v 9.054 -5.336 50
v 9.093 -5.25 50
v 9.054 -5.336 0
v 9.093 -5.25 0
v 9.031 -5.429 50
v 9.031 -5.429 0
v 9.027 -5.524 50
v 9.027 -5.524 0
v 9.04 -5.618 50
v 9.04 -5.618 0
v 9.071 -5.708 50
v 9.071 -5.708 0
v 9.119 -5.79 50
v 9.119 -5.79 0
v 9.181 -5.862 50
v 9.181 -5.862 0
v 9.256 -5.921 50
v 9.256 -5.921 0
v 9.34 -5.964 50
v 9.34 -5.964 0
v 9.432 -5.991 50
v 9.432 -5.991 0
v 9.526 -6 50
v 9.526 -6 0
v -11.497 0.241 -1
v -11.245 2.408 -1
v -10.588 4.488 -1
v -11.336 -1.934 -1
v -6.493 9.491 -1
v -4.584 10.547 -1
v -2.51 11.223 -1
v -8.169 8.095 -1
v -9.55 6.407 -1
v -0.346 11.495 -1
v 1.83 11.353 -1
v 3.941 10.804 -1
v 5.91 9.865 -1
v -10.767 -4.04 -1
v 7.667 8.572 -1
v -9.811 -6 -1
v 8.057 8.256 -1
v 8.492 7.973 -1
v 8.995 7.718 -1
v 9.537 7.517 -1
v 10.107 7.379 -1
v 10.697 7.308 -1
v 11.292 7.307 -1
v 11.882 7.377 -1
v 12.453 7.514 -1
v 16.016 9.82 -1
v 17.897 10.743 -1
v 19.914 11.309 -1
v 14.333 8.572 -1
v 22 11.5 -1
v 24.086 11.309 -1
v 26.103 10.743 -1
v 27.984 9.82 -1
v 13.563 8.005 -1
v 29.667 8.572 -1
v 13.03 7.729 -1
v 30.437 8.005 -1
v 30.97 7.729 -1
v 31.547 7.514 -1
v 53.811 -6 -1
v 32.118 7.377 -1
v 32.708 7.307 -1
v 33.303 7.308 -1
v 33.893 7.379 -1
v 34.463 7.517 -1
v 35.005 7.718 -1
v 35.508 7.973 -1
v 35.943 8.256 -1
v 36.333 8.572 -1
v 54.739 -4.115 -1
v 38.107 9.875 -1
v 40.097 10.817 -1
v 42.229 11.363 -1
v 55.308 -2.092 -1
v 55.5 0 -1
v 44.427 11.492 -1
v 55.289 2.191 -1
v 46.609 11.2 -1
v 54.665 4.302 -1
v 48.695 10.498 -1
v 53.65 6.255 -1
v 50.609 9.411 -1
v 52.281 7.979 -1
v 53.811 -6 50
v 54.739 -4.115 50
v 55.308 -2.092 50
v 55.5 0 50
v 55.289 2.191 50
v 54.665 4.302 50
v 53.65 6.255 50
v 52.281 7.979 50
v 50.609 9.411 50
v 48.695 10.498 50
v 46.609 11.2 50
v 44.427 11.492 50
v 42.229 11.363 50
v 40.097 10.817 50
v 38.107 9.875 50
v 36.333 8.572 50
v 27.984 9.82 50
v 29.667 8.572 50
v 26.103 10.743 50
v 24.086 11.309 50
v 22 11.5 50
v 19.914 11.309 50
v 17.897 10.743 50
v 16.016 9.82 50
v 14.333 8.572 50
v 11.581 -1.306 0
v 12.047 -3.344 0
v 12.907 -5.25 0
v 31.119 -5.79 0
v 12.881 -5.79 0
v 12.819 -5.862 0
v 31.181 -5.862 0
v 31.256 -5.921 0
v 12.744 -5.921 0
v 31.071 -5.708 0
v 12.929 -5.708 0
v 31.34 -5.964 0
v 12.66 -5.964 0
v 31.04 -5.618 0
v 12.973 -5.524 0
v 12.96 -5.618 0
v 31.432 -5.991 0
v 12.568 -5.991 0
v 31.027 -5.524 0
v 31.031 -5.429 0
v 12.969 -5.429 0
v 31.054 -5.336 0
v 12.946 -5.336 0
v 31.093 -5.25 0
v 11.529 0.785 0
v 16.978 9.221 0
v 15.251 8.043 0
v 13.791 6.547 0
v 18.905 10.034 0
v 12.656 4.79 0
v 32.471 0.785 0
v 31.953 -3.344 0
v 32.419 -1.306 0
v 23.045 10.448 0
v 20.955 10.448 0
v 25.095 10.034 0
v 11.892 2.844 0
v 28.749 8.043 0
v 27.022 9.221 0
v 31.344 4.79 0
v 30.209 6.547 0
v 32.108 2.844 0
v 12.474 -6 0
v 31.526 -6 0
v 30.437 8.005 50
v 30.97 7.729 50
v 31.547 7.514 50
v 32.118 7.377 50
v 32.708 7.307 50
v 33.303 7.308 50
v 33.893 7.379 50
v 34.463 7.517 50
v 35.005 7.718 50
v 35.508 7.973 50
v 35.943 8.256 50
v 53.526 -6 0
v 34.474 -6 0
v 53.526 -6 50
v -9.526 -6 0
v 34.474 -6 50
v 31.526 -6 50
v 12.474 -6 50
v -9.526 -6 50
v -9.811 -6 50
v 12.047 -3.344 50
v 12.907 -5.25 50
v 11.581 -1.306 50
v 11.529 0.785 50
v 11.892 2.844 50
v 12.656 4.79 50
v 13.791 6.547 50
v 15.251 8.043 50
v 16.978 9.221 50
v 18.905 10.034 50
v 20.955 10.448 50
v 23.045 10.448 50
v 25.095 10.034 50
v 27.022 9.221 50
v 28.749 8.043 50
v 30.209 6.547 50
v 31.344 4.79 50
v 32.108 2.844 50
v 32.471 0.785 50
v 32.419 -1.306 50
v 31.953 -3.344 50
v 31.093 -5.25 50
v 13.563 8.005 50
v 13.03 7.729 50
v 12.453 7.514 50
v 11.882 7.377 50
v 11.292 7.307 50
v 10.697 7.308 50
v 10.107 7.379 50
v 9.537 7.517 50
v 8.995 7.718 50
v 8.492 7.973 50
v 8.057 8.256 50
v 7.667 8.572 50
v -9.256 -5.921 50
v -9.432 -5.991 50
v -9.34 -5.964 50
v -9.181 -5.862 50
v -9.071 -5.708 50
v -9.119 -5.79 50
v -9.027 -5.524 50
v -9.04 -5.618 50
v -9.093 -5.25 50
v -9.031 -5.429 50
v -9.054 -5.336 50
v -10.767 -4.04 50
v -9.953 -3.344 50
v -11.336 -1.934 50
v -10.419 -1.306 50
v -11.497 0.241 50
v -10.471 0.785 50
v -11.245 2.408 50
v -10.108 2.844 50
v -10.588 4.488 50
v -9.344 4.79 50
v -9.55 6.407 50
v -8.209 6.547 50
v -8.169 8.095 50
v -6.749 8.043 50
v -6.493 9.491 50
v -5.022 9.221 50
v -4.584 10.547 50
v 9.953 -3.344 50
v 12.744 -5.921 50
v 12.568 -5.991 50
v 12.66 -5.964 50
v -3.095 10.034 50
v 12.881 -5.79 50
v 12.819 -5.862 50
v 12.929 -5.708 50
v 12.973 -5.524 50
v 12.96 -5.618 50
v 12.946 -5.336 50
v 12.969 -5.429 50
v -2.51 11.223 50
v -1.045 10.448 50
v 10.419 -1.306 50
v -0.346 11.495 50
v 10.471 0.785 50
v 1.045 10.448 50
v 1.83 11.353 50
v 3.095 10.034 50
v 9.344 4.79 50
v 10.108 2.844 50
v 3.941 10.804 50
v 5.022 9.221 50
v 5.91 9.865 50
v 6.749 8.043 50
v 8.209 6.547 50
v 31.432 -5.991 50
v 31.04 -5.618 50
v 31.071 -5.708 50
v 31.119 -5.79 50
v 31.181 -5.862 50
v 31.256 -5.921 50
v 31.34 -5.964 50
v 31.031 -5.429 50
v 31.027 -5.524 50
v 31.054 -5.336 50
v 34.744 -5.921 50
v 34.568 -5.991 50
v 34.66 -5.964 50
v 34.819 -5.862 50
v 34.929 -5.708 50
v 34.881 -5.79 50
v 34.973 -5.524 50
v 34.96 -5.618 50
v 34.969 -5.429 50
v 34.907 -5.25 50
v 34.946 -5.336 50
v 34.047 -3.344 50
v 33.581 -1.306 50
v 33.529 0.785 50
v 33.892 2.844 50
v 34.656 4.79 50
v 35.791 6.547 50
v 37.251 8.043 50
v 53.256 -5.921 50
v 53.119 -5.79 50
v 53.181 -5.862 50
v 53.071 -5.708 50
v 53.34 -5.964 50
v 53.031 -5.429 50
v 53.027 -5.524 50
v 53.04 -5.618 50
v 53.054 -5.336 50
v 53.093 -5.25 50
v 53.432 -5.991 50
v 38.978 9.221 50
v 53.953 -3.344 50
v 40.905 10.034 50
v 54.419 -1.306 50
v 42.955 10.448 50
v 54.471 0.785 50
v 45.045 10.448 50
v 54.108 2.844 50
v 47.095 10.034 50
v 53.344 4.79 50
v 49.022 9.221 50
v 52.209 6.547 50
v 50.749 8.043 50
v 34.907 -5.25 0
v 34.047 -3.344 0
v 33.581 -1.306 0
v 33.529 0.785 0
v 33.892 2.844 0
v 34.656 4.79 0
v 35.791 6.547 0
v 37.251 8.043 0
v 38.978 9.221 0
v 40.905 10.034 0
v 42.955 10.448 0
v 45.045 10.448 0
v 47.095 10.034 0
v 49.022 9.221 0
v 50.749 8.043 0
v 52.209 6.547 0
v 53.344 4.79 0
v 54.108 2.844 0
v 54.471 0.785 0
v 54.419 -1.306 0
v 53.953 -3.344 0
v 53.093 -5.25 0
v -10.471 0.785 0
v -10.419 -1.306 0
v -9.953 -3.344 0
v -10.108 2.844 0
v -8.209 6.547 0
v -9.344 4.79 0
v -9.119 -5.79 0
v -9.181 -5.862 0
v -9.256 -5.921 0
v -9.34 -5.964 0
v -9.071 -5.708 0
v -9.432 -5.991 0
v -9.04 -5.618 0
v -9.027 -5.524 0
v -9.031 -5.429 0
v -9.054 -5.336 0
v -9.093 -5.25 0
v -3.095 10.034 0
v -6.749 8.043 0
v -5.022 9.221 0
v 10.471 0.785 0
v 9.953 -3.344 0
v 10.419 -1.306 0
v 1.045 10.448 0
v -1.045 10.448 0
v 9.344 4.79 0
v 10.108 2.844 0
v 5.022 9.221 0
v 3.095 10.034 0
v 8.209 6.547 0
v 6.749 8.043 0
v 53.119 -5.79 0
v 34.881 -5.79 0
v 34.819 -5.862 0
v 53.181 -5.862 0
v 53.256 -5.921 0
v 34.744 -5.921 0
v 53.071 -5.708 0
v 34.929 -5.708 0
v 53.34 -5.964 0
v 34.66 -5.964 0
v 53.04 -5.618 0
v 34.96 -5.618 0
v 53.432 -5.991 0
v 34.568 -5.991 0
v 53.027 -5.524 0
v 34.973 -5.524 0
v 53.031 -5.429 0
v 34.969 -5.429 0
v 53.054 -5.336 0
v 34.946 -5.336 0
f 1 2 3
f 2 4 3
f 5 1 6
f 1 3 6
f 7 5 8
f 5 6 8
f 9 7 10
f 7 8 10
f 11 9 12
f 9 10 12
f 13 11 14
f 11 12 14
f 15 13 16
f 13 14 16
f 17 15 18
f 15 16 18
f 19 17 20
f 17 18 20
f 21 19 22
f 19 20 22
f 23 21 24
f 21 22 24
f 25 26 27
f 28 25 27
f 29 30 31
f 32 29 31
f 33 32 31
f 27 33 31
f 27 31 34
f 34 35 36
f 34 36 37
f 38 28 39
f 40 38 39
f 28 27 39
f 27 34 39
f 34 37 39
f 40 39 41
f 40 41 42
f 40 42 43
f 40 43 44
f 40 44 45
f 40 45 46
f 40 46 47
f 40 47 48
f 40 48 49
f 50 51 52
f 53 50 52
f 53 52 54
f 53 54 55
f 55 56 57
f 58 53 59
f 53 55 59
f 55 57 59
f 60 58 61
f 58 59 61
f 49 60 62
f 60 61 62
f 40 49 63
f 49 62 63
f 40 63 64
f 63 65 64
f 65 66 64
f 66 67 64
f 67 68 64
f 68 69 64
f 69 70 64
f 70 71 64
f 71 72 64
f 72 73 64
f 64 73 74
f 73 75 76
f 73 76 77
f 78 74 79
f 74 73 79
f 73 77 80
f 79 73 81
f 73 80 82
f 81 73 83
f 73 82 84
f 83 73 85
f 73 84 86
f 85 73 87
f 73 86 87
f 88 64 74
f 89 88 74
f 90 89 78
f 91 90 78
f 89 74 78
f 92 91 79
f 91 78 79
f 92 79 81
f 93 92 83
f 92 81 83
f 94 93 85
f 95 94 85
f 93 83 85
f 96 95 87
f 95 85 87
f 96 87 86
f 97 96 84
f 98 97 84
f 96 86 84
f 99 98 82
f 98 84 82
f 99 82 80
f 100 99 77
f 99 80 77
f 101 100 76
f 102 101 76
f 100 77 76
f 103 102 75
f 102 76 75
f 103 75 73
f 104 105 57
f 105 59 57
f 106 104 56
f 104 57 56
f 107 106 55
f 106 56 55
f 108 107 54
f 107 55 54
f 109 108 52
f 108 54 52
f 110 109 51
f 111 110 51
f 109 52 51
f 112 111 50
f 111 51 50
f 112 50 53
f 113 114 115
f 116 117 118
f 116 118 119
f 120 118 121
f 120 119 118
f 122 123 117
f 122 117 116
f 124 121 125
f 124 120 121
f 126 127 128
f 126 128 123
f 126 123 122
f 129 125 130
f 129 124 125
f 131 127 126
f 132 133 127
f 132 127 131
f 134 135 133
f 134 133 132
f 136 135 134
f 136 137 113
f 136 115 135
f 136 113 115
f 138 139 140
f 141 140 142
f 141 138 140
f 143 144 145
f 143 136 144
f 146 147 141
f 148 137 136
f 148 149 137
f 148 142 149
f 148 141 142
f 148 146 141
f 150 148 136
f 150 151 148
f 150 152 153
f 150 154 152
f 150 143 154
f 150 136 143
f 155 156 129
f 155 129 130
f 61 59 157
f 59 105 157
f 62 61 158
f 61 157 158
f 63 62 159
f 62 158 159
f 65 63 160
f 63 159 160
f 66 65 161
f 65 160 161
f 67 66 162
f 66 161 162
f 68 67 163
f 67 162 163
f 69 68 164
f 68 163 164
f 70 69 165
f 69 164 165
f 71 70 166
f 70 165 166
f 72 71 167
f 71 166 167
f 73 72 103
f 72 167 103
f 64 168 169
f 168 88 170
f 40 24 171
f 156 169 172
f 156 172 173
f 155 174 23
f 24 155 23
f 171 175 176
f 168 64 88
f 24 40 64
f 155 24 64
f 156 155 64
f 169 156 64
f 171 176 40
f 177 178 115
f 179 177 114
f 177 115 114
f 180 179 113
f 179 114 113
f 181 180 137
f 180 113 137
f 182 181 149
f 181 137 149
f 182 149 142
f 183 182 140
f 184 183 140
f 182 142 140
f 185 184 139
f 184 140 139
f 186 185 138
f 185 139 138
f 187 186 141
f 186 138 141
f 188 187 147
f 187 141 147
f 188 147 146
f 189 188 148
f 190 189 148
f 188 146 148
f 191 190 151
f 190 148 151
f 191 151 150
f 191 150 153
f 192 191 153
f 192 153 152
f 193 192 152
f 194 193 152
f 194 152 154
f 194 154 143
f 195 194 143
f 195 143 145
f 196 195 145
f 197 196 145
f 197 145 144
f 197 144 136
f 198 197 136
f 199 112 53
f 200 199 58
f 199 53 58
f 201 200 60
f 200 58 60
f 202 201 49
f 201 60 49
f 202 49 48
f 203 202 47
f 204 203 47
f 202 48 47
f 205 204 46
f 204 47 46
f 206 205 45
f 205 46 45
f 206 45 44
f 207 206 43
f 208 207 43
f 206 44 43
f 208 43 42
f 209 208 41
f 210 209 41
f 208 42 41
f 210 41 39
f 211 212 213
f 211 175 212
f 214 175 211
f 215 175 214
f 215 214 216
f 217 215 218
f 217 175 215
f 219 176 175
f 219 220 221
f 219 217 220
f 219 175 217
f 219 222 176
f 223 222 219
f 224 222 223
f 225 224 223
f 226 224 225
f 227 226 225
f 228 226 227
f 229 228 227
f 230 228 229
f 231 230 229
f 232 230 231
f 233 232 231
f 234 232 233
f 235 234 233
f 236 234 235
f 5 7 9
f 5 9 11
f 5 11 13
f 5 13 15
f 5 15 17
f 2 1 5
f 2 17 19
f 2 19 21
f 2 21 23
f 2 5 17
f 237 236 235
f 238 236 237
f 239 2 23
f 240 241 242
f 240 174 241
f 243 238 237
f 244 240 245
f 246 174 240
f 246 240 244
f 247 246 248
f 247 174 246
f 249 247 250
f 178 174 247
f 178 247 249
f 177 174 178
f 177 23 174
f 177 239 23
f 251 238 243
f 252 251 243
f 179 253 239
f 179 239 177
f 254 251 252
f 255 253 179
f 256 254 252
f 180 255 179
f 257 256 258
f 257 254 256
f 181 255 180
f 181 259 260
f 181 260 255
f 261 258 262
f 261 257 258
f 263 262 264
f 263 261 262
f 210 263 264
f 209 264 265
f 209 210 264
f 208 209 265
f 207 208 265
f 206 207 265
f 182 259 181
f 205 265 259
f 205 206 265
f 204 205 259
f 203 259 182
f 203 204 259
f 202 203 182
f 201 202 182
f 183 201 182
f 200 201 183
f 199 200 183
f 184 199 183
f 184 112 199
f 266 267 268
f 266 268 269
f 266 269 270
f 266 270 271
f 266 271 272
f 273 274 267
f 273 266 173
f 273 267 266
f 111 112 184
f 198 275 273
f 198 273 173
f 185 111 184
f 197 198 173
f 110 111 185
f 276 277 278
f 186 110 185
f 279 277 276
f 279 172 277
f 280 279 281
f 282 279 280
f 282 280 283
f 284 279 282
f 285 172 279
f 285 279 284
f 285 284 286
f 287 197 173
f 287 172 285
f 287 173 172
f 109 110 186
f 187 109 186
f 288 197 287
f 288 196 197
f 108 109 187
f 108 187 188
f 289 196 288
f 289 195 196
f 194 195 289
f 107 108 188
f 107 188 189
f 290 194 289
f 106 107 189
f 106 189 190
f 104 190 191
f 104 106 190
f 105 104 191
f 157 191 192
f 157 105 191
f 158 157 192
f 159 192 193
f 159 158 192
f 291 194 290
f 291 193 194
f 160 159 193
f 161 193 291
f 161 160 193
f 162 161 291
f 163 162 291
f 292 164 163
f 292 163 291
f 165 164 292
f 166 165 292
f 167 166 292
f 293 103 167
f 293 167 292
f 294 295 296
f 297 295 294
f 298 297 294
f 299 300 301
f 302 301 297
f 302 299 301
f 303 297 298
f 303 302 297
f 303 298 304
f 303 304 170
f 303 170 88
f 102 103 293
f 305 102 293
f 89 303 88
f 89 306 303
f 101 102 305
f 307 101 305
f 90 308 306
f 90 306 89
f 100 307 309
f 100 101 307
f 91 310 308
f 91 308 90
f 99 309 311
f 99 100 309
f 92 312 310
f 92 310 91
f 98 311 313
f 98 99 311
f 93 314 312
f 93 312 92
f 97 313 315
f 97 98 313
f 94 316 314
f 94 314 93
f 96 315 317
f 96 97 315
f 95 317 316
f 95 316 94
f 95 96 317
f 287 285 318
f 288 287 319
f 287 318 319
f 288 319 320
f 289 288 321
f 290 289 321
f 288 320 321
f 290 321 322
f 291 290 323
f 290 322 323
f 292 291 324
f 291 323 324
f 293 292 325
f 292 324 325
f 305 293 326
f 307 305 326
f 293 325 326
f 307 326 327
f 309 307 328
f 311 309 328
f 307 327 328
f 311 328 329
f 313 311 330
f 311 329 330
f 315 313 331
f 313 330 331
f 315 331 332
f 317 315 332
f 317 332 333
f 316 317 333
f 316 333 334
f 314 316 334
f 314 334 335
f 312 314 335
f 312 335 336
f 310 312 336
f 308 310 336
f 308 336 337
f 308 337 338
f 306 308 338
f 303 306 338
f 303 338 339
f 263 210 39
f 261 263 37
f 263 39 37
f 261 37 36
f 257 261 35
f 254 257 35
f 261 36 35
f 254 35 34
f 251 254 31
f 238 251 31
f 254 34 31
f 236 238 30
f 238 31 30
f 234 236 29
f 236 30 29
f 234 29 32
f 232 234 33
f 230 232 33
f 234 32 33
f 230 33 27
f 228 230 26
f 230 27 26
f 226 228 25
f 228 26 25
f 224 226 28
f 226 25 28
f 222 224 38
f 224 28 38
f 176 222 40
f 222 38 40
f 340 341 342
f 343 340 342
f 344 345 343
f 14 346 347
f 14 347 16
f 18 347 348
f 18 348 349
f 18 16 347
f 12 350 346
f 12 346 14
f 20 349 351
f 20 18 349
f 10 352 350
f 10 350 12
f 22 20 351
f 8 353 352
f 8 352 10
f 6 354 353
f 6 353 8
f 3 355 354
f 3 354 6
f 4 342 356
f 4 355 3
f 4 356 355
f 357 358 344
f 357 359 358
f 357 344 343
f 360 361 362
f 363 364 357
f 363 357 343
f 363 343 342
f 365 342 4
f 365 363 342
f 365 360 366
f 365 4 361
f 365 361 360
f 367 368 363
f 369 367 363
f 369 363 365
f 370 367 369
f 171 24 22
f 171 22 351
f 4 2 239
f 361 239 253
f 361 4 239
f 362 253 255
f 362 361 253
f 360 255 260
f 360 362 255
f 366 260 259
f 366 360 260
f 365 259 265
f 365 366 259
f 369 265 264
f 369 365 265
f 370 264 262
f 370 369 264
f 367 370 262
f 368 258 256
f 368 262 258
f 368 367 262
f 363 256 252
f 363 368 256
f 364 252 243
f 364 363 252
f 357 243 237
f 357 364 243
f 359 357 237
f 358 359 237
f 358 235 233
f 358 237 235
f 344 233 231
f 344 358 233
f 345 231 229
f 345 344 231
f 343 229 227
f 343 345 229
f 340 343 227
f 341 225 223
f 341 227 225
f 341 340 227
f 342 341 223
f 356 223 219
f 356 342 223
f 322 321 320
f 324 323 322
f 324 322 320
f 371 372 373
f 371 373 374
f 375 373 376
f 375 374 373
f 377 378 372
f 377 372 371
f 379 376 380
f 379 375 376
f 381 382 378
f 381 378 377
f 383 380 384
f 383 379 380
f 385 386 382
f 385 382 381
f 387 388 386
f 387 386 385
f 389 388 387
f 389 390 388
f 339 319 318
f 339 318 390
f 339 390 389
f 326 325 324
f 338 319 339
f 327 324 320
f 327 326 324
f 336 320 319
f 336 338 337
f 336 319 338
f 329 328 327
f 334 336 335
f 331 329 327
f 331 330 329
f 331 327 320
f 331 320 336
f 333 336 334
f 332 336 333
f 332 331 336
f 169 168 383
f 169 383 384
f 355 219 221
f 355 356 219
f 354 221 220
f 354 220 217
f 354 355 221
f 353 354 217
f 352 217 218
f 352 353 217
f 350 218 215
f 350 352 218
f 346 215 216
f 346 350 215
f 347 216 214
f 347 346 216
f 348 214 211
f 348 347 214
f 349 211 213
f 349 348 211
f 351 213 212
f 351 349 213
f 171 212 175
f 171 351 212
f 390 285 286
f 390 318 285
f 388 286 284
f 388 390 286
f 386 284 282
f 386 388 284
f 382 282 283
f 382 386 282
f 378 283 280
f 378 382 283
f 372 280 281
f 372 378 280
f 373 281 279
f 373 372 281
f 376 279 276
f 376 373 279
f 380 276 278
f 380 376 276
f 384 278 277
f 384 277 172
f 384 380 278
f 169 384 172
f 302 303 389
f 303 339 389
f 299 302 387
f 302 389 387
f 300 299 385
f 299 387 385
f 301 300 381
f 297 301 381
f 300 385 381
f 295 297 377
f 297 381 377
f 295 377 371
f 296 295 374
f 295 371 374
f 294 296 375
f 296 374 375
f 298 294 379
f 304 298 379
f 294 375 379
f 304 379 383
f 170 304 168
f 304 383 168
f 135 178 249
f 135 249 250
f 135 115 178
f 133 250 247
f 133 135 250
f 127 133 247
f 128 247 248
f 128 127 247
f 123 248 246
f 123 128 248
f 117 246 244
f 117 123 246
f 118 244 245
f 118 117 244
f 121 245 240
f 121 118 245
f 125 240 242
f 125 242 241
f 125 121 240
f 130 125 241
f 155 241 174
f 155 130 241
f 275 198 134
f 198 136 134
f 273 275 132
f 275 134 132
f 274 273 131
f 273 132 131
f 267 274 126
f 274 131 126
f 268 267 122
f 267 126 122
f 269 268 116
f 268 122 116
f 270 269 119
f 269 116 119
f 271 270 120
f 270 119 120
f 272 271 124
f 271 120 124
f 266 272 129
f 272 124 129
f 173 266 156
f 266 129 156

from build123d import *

# Parameters (mm, degrees)
F0_R     = 10.5
F1_DEPTH = 1
F2_DEPTH = 50
F3_R     = 5
F5_DEPTH = 51
F6_R     = 0.5


with BuildPart() as f1:
    # F0 (on Top) → F1 (new body)
    with BuildSketch(Plane.XY):
        with BuildLine():
            ThreePointArc((11, -3.3541019662), (10.6256868339, -1.6955824958), (10.5, 0))
            ThreePointArc((10.5, 0), (10.6256868339, 1.6955824958), (11, 3.3541019662))
            ThreePointArc((11, 3.3541019662), (-11.5, 0), (11, -3.3541019662))
        make_face()
        Circle(F0_R, mode=Mode.SUBTRACT)
        with BuildLine():
            ThreePointArc((55.5, 0), (45.6955824958, 11.3743131661), (33, 3.3541019662))
            ThreePointArc((33, 3.3541019662), (33.3743131661, 1.6955824958), (33.5, 0))
            ThreePointArc((33.5, 0), (33.3743131661, -1.6955824958), (33, -3.3541019662))
            ThreePointArc((33, -3.3541019662), (45.6955824958, -11.3743131661), (55.5, 0))
        make_face()
        with BuildLine():
            ThreePointArc((54.5, 0), (44, -10.5), (33.5, 0))
            ThreePointArc((33.5, 0), (44, 10.5), (54.5, 0))
        make_face(mode=Mode.SUBTRACT)
        Circle(F0_R)
        with BuildLine():
            ThreePointArc((32.5, 0), (22, 10.5), (11.5, 0))
            ThreePointArc((11.5, 0), (22, -10.5), (32.5, 0))
        make_face()
        with BuildLine():
            ThreePointArc((54.5, 0), (44, 10.5), (33.5, 0))
            ThreePointArc((33.5, 0), (44, -10.5), (54.5, 0))
        make_face()
        with BuildLine():
            ThreePointArc((33, 3.3541019662), (22, 11.5), (11, 3.3541019662))
            ThreePointArc((11, 3.3541019662), (11.3743131661, 1.6955824958), (11.5, 0))
            ThreePointArc((11.5, 0), (22, 10.5), (32.5, 0))
            ThreePointArc((32.5, 0), (32.6256868339, 1.6955824958), (33, 3.3541019662))
        make_face()
        with BuildLine():
            ThreePointArc((11.5, 0), (11.3743131661, -1.6955824958), (11, -3.3541019662))
            ThreePointArc((11, -3.3541019662), (22, -11.5), (33, -3.3541019662))
            ThreePointArc((33, -3.3541019662), (32.6256868339, -1.6955824958), (32.5, 0))
            ThreePointArc((32.5, 0), (22, -10.5), (11.5, 0))
        make_face()
        with BuildLine():
            ThreePointArc((11, 3.3541019662), (10.6256868339, 1.6955824958), (10.5, 0))
            ThreePointArc((10.5, 0), (10.6256868339, -1.6955824958), (11, -3.3541019662))
            ThreePointArc((11, -3.3541019662), (11.3743131661, -1.6955824958), (11.5, 0))
            ThreePointArc((11.5, 0), (11.3743131661, 1.6955824958), (11, 3.3541019662))
        make_face()
        with BuildLine():
            ThreePointArc((33.5, 0), (33.3743131661, 1.6955824958), (33, 3.3541019662))
            ThreePointArc((33, 3.3541019662), (32.6256868339, 1.6955824958), (32.5, 0))
            ThreePointArc((32.5, 0), (32.6256868339, -1.6955824958), (33, -3.3541019662))
            ThreePointArc((33, -3.3541019662), (33.3743131661, -1.6955824958), (33.5, 0))
        make_face()
    extrude(amount=-F1_DEPTH)

    # F0 (on Top) → F2 (join)
    with BuildSketch(Plane.XY):
        with BuildLine():
            ThreePointArc((11, -3.3541019662), (10.6256868339, -1.6955824958), (10.5, 0))
            ThreePointArc((10.5, 0), (10.6256868339, 1.6955824958), (11, 3.3541019662))
            ThreePointArc((11, 3.3541019662), (-11.5, 0), (11, -3.3541019662))
        make_face()
        Circle(F0_R, mode=Mode.SUBTRACT)
        with BuildLine():
            ThreePointArc((11, 3.3541019662), (10.6256868339, 1.6955824958), (10.5, 0))
            ThreePointArc((10.5, 0), (10.6256868339, -1.6955824958), (11, -3.3541019662))
            ThreePointArc((11, -3.3541019662), (11.3743131661, -1.6955824958), (11.5, 0))
            ThreePointArc((11.5, 0), (11.3743131661, 1.6955824958), (11, 3.3541019662))
        make_face()
        with BuildLine():
            ThreePointArc((33, 3.3541019662), (22, 11.5), (11, 3.3541019662))
            ThreePointArc((11, 3.3541019662), (11.3743131661, 1.6955824958), (11.5, 0))
            ThreePointArc((11.5, 0), (22, 10.5), (32.5, 0))
            ThreePointArc((32.5, 0), (32.6256868339, 1.6955824958), (33, 3.3541019662))
        make_face()
        with BuildLine():
            ThreePointArc((11.5, 0), (11.3743131661, -1.6955824958), (11, -3.3541019662))
            ThreePointArc((11, -3.3541019662), (22, -11.5), (33, -3.3541019662))
            ThreePointArc((33, -3.3541019662), (32.6256868339, -1.6955824958), (32.5, 0))
            ThreePointArc((32.5, 0), (22, -10.5), (11.5, 0))
        make_face()
        with BuildLine():
            ThreePointArc((33.5, 0), (33.3743131661, 1.6955824958), (33, 3.3541019662))
            ThreePointArc((33, 3.3541019662), (32.6256868339, 1.6955824958), (32.5, 0))
            ThreePointArc((32.5, 0), (32.6256868339, -1.6955824958), (33, -3.3541019662))
            ThreePointArc((33, -3.3541019662), (33.3743131661, -1.6955824958), (33.5, 0))
        make_face()
        with BuildLine():
            ThreePointArc((55.5, 0), (45.6955824958, 11.3743131661), (33, 3.3541019662))
            ThreePointArc((33, 3.3541019662), (33.3743131661, 1.6955824958), (33.5, 0))
            ThreePointArc((33.5, 0), (33.3743131661, -1.6955824958), (33, -3.3541019662))
            ThreePointArc((33, -3.3541019662), (45.6955824958, -11.3743131661), (55.5, 0))
        make_face()
        with BuildLine():
            ThreePointArc((54.5, 0), (44, -10.5), (33.5, 0))
            ThreePointArc((33.5, 0), (44, 10.5), (54.5, 0))
        make_face(mode=Mode.SUBTRACT)
    extrude(amount=F2_DEPTH)

    # F3
    f3_edges = [f1.edges().sort_by_distance(p)[0] for p in [
        (11, 3.354102, 24.5),
        (33, 3.354102, 24.5),
        (11, -3.354102, 24.5),
        (33, -3.354102, 24.5),
    ]]
    fillet(f3_edges, radius=F3_R)

    # F4 (on face) → F5 (cut, through all)
    with BuildSketch(Plane.XY.offset(50)):
        with BuildLine():
            Line((-8.6168439698, -6), (-9.8107084352, -6))
            ThreePointArc((-9.8107084352, -6), (-1.674067678, -11.3774996115), (7.6666666667, -8.5715939137))
            add(Edge.make_bspline(
                [(7.6666666667, -8.5715939137), (7.8739148264, -8.3862255244), (8.0987281428, -8.2100412723), (8.3407825678, -8.0456674851), (8.5991550728, -7.8958830707), (8.8721389341, -7.7633595184), (9.4430101632, -7.5370516436), (9.7409333736, -7.4433205753), (10.0487851549, -7.3712866338), (10.3635540468, -7.3226772778), (10.6817776263, -7.2983738762), (11.3169501229, -7.2983738762), (11.6339014321, -7.3224833437), (11.9474393092, -7.3707047572), (12.2541428107, -7.4421708702), (12.5510327606, -7.5351814239), (13.1223942737, -7.760709488), (13.3967057595, -7.8934858401), (13.6563094067, -8.0436938162), (13.8994714876, -8.2086307147), (14.1252554599, -8.3854834059), (14.3333333333, -8.5715939137)],
                knots=[0, 0, 0, 0, 0, 0, 0, 0.2498284224, 0.2498284224, 0.2498284224, 0.2498284224, 0.2498284224, 0.4999999993, 0.4999999993, 0.4999999993, 0.4999999993, 0.4999999993, 0.749171392, 0.749171392, 0.749171392, 0.749171392, 0.749171392, 1, 1, 1, 1, 1, 1, 1], degree=6))
            ThreePointArc((14.3333333333, -8.5715939137), (22, -11.5), (29.6666666667, -8.5715939137))
            add(Edge.make_bspline(
                [(36.3333333333, -8.5715939137), (36.1260851736, -8.3862255244), (35.9012718572, -8.2100412723), (35.6592174322, -8.0456674851), (35.4008449272, -7.8958830707), (35.1278610659, -7.7633595184), (34.5569898368, -7.5370516436), (34.2590666264, -7.4433205753), (33.9512148451, -7.3712866338), (33.6364459532, -7.3226772778), (33.3182223737, -7.2983738762), (32.6830498771, -7.2983738762), (32.3660985679, -7.3224833437), (32.0525606908, -7.3707047572), (31.7458571893, -7.4421708702), (31.4489672394, -7.5351814239), (30.8776057263, -7.760709488), (30.6032942405, -7.8934858401), (30.3436905933, -8.0436938162), (30.1005285124, -8.2086307147), (29.8747445401, -8.3854834059), (29.6666666667, -8.5715939137)],
                knots=[0, 0, 0, 0, 0, 0, 0, 0.2498284224, 0.2498284224, 0.2498284224, 0.2498284224, 0.2498284224, 0.4999999993, 0.4999999993, 0.4999999993, 0.4999999993, 0.4999999993, 0.749171392, 0.749171392, 0.749171392, 0.749171392, 0.749171392, 1, 1, 1, 1, 1, 1, 1], degree=6))
            ThreePointArc((36.3333333333, -8.5715939137), (45.674067678, -11.3774996115), (53.8107084352, -6))
            Line((53.8107084352, -6), (52.6168439698, -6))
            ThreePointArc((52.6168439698, -6), (44, -10.5), (35.3831560302, -6))
            Line((35.3831560302, -6), (30.6168439698, -6))
            ThreePointArc((30.6168439698, -6), (22, -10.5), (13.3831560302, -6))
            Line((13.3831560302, -6), (8.6168439698, -6))
            ThreePointArc((8.6168439698, -6), (0, -10.5), (-8.6168439698, -6))
        make_face()
        with BuildLine():
            Line((8.6168439698, -6), (-8.6168439698, -6))
            ThreePointArc((-8.6168439698, -6), (0, -10.5), (8.6168439698, -6))
        make_face()
        with BuildLine():
            Line((30.6168439698, -6), (13.3831560302, -6))
            ThreePointArc((13.3831560302, -6), (22, -10.5), (30.6168439698, -6))
        make_face()
        with BuildLine():
            ThreePointArc((35.3831560302, -6), (44, -10.5), (52.6168439698, -6))
            Line((52.6168439698, -6), (35.3831560302, -6))
        make_face()
    extrude(amount=-F5_DEPTH, mode=Mode.SUBTRACT)

    # F6
    f6_edges = [f1.edges().sort_by_distance(p)[0] for p in [
        (-8.616844, -6, 25),
        (8.616844, -6, 25),
        (13.383156, -6, 25),
        (30.616844, -6, 25),
        (35.383156, -6, 25),
        (52.616844, -6, 25),
    ]]
    fillet(f6_edges, radius=F6_R)


solid = f1.part
